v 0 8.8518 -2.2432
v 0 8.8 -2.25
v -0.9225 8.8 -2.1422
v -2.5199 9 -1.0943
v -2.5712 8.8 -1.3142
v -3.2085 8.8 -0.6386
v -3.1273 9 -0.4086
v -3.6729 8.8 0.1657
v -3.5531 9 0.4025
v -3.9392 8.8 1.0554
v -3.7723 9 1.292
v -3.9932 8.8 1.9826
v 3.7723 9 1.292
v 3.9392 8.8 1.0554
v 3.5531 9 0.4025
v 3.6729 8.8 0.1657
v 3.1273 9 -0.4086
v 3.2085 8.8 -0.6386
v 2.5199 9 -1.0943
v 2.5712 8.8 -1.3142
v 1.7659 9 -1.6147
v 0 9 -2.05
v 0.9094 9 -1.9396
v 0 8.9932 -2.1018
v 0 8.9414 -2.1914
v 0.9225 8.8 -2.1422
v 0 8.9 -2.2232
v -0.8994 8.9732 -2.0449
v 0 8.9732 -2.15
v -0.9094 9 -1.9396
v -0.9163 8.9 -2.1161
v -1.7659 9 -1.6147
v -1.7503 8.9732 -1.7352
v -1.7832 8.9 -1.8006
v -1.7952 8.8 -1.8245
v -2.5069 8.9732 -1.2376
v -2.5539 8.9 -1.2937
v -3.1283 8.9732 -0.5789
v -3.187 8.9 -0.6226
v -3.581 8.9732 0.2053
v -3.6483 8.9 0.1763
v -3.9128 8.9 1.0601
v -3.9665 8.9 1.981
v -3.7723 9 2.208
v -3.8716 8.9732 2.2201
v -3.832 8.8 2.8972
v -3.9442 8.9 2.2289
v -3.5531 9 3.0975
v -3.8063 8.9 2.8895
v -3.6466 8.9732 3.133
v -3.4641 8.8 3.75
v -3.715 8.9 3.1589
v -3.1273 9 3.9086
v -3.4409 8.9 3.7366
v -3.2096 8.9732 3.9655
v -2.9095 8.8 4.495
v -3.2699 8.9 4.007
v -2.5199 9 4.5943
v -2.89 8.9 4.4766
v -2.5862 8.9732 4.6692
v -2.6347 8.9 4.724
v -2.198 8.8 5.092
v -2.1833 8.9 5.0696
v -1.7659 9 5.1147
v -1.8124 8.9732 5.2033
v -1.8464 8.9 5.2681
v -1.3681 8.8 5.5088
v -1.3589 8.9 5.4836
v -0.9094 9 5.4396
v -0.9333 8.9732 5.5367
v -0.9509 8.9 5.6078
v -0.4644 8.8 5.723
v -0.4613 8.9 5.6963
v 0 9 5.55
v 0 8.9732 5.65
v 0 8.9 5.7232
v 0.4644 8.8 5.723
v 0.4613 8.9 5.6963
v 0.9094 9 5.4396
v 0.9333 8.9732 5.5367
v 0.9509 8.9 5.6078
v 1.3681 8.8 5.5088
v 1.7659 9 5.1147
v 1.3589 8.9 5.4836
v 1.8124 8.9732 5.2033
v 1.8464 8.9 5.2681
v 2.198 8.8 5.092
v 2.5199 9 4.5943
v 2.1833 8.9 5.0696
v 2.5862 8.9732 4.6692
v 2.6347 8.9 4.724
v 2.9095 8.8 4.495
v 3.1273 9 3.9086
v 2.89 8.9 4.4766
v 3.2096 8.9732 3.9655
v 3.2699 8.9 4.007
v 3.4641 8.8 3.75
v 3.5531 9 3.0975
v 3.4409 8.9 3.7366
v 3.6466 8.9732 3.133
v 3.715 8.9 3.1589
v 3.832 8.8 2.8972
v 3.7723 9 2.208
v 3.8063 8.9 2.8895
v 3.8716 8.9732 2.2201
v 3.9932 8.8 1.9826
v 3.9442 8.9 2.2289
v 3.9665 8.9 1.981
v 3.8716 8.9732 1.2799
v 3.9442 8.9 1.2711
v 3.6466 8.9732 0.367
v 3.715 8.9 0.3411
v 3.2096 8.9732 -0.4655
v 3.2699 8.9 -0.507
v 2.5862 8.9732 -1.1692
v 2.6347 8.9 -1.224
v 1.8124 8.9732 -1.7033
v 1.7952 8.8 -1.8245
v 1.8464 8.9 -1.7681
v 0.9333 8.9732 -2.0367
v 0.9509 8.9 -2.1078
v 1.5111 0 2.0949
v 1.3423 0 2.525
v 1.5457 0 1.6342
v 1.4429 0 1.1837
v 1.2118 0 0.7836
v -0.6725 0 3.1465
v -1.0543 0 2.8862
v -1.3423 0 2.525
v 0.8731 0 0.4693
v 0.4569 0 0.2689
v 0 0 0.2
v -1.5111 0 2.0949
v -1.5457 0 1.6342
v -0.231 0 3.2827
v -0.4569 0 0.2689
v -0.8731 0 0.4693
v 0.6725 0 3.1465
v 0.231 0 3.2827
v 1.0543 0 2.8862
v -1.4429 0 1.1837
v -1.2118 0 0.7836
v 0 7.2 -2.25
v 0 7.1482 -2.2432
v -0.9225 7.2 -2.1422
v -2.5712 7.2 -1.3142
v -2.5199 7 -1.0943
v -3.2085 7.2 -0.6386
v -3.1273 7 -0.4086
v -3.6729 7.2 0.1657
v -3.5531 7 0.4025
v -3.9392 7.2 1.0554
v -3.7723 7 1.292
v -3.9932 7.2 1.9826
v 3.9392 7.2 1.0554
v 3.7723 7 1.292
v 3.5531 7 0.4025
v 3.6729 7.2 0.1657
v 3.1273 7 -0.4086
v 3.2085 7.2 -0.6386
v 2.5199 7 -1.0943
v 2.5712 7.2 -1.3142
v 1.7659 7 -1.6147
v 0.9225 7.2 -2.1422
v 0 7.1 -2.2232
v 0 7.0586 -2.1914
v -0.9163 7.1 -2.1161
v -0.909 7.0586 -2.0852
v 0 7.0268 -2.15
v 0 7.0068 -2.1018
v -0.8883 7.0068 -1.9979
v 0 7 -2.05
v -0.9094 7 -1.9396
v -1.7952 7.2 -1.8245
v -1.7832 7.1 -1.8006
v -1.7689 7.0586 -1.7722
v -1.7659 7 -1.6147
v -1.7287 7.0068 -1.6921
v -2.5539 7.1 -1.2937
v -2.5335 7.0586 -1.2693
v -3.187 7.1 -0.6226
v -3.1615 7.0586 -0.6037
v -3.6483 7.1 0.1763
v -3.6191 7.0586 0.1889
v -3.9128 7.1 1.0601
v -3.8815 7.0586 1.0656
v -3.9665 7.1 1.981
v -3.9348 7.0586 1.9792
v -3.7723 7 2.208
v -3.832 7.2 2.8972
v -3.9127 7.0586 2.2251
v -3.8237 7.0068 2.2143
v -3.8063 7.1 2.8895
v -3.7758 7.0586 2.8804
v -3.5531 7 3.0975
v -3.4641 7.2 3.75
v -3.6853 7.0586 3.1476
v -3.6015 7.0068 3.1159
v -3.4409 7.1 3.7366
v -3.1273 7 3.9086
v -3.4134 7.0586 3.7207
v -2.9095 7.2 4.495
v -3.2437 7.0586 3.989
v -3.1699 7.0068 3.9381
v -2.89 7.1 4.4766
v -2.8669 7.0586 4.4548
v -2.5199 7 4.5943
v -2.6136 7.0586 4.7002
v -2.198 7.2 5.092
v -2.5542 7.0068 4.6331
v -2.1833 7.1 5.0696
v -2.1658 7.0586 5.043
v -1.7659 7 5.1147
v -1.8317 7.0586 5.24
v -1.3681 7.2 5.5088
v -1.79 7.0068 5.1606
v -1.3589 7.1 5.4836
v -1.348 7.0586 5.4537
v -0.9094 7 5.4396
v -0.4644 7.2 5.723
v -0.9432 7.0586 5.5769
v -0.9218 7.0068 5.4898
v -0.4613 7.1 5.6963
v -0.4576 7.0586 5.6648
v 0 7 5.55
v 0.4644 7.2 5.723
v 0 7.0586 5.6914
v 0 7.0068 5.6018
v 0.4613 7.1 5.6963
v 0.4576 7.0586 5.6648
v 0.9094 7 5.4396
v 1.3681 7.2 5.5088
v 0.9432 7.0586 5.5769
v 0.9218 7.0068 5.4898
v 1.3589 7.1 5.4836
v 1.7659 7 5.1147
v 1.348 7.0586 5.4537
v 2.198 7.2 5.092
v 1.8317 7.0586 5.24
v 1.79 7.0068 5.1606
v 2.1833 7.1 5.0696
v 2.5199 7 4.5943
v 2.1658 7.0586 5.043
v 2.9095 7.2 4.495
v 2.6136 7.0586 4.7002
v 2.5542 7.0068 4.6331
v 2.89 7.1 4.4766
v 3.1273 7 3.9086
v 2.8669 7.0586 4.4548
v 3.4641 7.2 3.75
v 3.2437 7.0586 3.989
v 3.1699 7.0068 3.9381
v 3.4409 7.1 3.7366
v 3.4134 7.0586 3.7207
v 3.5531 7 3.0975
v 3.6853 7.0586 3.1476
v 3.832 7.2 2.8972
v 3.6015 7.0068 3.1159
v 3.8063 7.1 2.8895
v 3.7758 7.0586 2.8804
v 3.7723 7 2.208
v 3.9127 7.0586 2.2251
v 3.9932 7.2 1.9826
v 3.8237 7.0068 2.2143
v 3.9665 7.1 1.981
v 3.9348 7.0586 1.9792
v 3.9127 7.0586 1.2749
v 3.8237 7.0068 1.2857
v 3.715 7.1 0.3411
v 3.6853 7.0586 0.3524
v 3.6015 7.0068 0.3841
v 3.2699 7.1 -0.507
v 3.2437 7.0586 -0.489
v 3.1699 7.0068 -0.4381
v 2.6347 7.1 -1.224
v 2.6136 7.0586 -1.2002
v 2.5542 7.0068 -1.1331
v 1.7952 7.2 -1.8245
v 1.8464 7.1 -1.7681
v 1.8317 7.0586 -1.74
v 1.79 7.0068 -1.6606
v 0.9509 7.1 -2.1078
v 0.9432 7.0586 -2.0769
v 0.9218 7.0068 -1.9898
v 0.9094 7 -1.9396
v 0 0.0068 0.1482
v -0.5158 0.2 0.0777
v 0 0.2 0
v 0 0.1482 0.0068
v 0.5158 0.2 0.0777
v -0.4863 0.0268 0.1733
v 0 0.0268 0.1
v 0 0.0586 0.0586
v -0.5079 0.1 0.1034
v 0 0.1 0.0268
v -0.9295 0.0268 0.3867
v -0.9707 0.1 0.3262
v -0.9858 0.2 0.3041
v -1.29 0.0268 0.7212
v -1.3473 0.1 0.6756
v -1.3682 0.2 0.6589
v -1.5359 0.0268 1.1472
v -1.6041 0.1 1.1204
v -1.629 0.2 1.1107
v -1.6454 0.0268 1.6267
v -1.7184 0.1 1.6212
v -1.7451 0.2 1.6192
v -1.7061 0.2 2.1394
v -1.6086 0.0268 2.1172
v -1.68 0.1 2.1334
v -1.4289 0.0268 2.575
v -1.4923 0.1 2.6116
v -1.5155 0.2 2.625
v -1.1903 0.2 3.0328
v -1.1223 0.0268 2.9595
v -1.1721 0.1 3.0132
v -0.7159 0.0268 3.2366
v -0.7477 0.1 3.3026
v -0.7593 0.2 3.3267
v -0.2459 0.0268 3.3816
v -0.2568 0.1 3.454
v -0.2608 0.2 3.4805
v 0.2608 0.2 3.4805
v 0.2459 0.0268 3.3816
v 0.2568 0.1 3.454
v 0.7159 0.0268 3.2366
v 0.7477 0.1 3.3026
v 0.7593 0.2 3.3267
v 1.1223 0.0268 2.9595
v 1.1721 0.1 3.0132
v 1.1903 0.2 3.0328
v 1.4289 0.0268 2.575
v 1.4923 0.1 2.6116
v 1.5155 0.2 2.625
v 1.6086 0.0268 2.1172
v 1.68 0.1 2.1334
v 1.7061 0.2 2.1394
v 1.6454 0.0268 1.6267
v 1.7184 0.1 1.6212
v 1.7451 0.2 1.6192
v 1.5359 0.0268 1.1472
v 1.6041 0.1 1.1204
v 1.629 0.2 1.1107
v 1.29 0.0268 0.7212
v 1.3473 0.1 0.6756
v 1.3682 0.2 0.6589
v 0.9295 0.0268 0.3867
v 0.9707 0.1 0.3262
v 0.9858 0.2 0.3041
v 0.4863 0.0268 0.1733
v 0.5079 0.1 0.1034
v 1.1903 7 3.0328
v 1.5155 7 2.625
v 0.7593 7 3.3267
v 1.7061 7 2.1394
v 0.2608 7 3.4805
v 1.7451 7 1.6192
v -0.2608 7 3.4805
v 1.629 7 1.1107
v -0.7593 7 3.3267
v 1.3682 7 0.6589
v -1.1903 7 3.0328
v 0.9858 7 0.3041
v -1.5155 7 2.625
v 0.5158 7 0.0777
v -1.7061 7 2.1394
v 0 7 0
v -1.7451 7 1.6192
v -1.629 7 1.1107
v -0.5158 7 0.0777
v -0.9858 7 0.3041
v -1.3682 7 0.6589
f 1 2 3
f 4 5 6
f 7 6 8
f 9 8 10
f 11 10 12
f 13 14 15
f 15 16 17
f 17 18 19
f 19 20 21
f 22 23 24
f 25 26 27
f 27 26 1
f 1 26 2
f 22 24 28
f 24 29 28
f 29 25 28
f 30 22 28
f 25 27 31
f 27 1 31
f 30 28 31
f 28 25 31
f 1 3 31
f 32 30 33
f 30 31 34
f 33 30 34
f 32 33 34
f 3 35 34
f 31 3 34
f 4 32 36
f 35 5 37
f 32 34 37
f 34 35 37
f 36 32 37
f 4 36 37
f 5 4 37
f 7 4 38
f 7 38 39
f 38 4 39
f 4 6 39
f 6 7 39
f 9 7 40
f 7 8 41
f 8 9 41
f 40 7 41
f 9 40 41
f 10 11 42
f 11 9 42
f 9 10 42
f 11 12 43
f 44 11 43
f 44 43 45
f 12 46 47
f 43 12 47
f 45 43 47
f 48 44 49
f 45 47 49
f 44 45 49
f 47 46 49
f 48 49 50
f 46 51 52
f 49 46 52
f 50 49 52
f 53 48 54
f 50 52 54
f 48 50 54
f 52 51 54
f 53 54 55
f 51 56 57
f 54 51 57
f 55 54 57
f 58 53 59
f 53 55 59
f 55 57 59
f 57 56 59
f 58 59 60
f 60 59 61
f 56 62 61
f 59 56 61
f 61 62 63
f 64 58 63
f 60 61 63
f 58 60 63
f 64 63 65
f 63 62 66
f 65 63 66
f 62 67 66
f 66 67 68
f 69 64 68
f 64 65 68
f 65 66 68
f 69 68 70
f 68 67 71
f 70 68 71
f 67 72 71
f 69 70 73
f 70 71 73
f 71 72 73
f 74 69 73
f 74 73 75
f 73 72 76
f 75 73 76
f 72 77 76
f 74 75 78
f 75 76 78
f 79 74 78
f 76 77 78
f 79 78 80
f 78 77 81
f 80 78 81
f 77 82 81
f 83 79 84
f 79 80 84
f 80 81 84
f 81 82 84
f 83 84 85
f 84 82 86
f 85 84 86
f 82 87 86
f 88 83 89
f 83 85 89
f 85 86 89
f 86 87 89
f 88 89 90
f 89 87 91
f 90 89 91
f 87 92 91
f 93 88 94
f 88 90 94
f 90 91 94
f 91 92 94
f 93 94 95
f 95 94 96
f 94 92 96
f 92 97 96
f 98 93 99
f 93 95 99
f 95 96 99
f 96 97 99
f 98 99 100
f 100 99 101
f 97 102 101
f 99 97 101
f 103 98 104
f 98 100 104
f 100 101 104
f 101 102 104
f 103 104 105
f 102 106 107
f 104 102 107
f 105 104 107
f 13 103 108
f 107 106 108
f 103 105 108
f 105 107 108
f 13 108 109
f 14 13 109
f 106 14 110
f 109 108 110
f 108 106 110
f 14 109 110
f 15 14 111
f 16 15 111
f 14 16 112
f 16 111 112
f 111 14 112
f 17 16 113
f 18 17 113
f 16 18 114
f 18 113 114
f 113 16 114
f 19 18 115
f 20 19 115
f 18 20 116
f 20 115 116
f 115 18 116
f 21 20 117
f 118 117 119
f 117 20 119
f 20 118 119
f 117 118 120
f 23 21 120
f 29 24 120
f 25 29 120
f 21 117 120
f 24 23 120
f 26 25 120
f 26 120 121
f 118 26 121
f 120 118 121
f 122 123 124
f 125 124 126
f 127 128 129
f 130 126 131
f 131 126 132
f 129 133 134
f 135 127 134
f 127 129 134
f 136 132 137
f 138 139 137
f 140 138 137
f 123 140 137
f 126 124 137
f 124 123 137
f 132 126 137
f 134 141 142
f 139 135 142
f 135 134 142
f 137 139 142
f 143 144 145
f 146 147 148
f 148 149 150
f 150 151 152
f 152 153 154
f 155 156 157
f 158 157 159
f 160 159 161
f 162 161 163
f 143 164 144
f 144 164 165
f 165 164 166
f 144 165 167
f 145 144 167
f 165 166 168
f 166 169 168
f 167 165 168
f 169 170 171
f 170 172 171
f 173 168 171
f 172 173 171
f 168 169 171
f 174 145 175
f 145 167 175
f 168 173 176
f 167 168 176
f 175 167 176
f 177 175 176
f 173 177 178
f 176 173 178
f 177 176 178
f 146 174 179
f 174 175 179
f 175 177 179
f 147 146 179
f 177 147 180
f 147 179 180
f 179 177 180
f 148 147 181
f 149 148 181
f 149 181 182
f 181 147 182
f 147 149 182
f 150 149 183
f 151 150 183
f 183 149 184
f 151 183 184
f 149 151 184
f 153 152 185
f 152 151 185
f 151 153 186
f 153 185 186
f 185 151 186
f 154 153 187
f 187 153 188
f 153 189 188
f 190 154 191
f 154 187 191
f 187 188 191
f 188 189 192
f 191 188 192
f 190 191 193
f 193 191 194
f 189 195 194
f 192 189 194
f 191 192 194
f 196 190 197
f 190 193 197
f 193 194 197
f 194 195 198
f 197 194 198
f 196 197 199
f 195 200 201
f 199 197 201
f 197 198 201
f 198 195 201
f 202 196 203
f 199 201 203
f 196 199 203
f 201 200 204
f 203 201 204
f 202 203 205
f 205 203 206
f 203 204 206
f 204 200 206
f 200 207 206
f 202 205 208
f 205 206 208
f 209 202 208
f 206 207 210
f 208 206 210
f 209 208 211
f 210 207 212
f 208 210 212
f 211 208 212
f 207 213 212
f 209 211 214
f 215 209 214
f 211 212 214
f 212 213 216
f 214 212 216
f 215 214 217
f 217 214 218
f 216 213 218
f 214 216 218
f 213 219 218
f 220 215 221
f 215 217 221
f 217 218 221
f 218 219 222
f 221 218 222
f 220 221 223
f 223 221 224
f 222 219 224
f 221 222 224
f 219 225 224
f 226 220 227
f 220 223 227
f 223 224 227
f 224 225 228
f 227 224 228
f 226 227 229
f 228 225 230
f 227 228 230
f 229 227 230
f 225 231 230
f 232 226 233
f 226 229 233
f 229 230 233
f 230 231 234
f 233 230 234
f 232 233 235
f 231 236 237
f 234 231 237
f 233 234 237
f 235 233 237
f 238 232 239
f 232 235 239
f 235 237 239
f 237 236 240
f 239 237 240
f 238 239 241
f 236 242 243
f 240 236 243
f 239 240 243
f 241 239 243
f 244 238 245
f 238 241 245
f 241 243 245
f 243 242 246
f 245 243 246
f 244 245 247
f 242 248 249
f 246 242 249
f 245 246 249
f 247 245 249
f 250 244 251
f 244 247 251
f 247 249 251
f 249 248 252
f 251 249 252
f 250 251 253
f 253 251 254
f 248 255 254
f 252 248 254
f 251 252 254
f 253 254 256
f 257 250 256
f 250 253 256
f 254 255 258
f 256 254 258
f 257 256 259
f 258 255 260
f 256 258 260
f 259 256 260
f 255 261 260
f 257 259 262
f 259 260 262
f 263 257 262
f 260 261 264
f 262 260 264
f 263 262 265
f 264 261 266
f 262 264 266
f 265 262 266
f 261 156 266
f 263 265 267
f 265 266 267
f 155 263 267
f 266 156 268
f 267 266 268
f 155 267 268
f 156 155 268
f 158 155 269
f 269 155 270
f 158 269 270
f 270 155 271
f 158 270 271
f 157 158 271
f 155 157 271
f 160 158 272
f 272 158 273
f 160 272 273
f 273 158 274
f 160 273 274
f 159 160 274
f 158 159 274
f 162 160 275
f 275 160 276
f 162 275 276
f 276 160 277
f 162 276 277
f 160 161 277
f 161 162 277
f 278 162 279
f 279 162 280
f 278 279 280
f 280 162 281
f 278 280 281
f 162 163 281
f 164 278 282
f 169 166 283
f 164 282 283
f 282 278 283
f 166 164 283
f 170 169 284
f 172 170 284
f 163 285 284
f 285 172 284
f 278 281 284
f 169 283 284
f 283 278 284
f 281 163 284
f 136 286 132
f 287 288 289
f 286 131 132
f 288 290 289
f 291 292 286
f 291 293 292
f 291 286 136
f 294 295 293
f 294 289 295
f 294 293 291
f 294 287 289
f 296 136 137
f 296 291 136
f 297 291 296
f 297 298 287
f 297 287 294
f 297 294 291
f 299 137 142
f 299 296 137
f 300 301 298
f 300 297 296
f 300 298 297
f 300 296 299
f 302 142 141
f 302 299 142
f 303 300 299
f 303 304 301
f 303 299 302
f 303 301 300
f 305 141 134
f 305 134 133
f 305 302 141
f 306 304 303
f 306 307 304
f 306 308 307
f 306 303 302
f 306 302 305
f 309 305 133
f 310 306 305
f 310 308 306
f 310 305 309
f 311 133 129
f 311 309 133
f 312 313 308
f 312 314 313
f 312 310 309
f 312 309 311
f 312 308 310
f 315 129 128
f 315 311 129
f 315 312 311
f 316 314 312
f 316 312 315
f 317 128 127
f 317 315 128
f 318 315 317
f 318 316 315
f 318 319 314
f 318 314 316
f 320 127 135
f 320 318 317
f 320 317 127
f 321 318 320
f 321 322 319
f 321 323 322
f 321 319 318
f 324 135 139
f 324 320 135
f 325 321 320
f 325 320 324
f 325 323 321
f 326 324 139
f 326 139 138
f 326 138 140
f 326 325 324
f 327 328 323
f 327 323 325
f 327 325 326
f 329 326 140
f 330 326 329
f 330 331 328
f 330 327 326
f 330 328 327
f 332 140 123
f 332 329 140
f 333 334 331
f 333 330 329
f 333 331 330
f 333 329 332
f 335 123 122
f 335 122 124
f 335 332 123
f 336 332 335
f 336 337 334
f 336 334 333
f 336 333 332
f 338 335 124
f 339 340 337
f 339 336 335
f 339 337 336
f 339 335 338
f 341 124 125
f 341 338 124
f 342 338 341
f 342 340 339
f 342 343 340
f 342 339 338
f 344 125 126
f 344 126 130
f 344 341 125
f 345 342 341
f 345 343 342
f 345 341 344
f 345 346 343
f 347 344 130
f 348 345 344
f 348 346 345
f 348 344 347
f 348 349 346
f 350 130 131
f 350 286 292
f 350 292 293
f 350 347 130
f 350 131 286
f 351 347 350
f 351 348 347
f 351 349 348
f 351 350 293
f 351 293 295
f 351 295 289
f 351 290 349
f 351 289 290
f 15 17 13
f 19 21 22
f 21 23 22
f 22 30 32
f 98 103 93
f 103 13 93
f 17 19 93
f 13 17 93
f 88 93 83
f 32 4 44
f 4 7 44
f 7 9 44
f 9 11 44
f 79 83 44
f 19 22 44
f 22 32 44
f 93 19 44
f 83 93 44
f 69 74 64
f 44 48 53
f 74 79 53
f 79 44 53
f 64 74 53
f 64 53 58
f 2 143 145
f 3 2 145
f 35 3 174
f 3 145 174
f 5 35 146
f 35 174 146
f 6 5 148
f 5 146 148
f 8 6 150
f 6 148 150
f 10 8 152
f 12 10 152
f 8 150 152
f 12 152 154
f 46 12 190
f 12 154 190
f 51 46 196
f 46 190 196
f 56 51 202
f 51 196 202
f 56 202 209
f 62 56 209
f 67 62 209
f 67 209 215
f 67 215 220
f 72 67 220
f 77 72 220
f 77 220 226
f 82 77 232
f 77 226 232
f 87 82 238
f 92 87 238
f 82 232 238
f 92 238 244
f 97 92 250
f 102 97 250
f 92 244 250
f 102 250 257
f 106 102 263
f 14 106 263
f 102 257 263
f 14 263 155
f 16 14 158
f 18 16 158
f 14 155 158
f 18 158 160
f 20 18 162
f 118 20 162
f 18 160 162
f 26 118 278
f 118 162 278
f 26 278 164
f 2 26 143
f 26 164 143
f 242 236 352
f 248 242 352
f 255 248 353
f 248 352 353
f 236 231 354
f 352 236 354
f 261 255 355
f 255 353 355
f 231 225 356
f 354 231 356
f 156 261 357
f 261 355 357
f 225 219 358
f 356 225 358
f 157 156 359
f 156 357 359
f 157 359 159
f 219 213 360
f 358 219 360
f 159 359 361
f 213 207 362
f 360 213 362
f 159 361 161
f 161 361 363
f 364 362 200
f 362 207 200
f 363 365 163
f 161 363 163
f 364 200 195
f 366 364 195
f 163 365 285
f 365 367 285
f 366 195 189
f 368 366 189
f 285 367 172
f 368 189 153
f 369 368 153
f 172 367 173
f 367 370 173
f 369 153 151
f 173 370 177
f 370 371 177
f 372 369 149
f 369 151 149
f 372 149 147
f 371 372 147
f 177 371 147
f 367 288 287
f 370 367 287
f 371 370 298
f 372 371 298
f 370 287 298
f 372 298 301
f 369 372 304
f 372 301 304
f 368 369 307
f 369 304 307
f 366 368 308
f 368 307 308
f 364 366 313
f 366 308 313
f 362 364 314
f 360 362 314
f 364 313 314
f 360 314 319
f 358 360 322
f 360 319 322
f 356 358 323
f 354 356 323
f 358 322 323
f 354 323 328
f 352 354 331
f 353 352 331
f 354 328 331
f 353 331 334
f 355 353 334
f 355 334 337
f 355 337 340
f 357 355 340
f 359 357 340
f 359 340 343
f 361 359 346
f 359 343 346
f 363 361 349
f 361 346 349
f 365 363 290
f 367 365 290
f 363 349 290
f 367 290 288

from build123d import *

# Parameters (mm, degrees)
FILLET1_R = 0.2


with BuildPart() as part:
    # Sketch1 → Revolve1 (revolve)
    with BuildSketch(Plane(origin=(0, 0, 0), x_dir=(0, 0, -1), z_dir=(1, 0, 0))):
        Polygon((0, 0), (-1.75, 0), (-1.75, 9), (2.25, 9), (2.25, 7), (0, 7), align=None)
    revolve(axis=Axis((0, 0, 1.75), (0, 1, 0)))

    # Fillet1
    fillet1_edges = [part.edges().sort_by_distance(p)[0] for p in [
        (0, 7, 5.75),
        (0, 9, 5.75),
        (0, 0, 3.5),
    ]]
    fillet(fillet1_edges, radius=FILLET1_R)


solid = part.part
